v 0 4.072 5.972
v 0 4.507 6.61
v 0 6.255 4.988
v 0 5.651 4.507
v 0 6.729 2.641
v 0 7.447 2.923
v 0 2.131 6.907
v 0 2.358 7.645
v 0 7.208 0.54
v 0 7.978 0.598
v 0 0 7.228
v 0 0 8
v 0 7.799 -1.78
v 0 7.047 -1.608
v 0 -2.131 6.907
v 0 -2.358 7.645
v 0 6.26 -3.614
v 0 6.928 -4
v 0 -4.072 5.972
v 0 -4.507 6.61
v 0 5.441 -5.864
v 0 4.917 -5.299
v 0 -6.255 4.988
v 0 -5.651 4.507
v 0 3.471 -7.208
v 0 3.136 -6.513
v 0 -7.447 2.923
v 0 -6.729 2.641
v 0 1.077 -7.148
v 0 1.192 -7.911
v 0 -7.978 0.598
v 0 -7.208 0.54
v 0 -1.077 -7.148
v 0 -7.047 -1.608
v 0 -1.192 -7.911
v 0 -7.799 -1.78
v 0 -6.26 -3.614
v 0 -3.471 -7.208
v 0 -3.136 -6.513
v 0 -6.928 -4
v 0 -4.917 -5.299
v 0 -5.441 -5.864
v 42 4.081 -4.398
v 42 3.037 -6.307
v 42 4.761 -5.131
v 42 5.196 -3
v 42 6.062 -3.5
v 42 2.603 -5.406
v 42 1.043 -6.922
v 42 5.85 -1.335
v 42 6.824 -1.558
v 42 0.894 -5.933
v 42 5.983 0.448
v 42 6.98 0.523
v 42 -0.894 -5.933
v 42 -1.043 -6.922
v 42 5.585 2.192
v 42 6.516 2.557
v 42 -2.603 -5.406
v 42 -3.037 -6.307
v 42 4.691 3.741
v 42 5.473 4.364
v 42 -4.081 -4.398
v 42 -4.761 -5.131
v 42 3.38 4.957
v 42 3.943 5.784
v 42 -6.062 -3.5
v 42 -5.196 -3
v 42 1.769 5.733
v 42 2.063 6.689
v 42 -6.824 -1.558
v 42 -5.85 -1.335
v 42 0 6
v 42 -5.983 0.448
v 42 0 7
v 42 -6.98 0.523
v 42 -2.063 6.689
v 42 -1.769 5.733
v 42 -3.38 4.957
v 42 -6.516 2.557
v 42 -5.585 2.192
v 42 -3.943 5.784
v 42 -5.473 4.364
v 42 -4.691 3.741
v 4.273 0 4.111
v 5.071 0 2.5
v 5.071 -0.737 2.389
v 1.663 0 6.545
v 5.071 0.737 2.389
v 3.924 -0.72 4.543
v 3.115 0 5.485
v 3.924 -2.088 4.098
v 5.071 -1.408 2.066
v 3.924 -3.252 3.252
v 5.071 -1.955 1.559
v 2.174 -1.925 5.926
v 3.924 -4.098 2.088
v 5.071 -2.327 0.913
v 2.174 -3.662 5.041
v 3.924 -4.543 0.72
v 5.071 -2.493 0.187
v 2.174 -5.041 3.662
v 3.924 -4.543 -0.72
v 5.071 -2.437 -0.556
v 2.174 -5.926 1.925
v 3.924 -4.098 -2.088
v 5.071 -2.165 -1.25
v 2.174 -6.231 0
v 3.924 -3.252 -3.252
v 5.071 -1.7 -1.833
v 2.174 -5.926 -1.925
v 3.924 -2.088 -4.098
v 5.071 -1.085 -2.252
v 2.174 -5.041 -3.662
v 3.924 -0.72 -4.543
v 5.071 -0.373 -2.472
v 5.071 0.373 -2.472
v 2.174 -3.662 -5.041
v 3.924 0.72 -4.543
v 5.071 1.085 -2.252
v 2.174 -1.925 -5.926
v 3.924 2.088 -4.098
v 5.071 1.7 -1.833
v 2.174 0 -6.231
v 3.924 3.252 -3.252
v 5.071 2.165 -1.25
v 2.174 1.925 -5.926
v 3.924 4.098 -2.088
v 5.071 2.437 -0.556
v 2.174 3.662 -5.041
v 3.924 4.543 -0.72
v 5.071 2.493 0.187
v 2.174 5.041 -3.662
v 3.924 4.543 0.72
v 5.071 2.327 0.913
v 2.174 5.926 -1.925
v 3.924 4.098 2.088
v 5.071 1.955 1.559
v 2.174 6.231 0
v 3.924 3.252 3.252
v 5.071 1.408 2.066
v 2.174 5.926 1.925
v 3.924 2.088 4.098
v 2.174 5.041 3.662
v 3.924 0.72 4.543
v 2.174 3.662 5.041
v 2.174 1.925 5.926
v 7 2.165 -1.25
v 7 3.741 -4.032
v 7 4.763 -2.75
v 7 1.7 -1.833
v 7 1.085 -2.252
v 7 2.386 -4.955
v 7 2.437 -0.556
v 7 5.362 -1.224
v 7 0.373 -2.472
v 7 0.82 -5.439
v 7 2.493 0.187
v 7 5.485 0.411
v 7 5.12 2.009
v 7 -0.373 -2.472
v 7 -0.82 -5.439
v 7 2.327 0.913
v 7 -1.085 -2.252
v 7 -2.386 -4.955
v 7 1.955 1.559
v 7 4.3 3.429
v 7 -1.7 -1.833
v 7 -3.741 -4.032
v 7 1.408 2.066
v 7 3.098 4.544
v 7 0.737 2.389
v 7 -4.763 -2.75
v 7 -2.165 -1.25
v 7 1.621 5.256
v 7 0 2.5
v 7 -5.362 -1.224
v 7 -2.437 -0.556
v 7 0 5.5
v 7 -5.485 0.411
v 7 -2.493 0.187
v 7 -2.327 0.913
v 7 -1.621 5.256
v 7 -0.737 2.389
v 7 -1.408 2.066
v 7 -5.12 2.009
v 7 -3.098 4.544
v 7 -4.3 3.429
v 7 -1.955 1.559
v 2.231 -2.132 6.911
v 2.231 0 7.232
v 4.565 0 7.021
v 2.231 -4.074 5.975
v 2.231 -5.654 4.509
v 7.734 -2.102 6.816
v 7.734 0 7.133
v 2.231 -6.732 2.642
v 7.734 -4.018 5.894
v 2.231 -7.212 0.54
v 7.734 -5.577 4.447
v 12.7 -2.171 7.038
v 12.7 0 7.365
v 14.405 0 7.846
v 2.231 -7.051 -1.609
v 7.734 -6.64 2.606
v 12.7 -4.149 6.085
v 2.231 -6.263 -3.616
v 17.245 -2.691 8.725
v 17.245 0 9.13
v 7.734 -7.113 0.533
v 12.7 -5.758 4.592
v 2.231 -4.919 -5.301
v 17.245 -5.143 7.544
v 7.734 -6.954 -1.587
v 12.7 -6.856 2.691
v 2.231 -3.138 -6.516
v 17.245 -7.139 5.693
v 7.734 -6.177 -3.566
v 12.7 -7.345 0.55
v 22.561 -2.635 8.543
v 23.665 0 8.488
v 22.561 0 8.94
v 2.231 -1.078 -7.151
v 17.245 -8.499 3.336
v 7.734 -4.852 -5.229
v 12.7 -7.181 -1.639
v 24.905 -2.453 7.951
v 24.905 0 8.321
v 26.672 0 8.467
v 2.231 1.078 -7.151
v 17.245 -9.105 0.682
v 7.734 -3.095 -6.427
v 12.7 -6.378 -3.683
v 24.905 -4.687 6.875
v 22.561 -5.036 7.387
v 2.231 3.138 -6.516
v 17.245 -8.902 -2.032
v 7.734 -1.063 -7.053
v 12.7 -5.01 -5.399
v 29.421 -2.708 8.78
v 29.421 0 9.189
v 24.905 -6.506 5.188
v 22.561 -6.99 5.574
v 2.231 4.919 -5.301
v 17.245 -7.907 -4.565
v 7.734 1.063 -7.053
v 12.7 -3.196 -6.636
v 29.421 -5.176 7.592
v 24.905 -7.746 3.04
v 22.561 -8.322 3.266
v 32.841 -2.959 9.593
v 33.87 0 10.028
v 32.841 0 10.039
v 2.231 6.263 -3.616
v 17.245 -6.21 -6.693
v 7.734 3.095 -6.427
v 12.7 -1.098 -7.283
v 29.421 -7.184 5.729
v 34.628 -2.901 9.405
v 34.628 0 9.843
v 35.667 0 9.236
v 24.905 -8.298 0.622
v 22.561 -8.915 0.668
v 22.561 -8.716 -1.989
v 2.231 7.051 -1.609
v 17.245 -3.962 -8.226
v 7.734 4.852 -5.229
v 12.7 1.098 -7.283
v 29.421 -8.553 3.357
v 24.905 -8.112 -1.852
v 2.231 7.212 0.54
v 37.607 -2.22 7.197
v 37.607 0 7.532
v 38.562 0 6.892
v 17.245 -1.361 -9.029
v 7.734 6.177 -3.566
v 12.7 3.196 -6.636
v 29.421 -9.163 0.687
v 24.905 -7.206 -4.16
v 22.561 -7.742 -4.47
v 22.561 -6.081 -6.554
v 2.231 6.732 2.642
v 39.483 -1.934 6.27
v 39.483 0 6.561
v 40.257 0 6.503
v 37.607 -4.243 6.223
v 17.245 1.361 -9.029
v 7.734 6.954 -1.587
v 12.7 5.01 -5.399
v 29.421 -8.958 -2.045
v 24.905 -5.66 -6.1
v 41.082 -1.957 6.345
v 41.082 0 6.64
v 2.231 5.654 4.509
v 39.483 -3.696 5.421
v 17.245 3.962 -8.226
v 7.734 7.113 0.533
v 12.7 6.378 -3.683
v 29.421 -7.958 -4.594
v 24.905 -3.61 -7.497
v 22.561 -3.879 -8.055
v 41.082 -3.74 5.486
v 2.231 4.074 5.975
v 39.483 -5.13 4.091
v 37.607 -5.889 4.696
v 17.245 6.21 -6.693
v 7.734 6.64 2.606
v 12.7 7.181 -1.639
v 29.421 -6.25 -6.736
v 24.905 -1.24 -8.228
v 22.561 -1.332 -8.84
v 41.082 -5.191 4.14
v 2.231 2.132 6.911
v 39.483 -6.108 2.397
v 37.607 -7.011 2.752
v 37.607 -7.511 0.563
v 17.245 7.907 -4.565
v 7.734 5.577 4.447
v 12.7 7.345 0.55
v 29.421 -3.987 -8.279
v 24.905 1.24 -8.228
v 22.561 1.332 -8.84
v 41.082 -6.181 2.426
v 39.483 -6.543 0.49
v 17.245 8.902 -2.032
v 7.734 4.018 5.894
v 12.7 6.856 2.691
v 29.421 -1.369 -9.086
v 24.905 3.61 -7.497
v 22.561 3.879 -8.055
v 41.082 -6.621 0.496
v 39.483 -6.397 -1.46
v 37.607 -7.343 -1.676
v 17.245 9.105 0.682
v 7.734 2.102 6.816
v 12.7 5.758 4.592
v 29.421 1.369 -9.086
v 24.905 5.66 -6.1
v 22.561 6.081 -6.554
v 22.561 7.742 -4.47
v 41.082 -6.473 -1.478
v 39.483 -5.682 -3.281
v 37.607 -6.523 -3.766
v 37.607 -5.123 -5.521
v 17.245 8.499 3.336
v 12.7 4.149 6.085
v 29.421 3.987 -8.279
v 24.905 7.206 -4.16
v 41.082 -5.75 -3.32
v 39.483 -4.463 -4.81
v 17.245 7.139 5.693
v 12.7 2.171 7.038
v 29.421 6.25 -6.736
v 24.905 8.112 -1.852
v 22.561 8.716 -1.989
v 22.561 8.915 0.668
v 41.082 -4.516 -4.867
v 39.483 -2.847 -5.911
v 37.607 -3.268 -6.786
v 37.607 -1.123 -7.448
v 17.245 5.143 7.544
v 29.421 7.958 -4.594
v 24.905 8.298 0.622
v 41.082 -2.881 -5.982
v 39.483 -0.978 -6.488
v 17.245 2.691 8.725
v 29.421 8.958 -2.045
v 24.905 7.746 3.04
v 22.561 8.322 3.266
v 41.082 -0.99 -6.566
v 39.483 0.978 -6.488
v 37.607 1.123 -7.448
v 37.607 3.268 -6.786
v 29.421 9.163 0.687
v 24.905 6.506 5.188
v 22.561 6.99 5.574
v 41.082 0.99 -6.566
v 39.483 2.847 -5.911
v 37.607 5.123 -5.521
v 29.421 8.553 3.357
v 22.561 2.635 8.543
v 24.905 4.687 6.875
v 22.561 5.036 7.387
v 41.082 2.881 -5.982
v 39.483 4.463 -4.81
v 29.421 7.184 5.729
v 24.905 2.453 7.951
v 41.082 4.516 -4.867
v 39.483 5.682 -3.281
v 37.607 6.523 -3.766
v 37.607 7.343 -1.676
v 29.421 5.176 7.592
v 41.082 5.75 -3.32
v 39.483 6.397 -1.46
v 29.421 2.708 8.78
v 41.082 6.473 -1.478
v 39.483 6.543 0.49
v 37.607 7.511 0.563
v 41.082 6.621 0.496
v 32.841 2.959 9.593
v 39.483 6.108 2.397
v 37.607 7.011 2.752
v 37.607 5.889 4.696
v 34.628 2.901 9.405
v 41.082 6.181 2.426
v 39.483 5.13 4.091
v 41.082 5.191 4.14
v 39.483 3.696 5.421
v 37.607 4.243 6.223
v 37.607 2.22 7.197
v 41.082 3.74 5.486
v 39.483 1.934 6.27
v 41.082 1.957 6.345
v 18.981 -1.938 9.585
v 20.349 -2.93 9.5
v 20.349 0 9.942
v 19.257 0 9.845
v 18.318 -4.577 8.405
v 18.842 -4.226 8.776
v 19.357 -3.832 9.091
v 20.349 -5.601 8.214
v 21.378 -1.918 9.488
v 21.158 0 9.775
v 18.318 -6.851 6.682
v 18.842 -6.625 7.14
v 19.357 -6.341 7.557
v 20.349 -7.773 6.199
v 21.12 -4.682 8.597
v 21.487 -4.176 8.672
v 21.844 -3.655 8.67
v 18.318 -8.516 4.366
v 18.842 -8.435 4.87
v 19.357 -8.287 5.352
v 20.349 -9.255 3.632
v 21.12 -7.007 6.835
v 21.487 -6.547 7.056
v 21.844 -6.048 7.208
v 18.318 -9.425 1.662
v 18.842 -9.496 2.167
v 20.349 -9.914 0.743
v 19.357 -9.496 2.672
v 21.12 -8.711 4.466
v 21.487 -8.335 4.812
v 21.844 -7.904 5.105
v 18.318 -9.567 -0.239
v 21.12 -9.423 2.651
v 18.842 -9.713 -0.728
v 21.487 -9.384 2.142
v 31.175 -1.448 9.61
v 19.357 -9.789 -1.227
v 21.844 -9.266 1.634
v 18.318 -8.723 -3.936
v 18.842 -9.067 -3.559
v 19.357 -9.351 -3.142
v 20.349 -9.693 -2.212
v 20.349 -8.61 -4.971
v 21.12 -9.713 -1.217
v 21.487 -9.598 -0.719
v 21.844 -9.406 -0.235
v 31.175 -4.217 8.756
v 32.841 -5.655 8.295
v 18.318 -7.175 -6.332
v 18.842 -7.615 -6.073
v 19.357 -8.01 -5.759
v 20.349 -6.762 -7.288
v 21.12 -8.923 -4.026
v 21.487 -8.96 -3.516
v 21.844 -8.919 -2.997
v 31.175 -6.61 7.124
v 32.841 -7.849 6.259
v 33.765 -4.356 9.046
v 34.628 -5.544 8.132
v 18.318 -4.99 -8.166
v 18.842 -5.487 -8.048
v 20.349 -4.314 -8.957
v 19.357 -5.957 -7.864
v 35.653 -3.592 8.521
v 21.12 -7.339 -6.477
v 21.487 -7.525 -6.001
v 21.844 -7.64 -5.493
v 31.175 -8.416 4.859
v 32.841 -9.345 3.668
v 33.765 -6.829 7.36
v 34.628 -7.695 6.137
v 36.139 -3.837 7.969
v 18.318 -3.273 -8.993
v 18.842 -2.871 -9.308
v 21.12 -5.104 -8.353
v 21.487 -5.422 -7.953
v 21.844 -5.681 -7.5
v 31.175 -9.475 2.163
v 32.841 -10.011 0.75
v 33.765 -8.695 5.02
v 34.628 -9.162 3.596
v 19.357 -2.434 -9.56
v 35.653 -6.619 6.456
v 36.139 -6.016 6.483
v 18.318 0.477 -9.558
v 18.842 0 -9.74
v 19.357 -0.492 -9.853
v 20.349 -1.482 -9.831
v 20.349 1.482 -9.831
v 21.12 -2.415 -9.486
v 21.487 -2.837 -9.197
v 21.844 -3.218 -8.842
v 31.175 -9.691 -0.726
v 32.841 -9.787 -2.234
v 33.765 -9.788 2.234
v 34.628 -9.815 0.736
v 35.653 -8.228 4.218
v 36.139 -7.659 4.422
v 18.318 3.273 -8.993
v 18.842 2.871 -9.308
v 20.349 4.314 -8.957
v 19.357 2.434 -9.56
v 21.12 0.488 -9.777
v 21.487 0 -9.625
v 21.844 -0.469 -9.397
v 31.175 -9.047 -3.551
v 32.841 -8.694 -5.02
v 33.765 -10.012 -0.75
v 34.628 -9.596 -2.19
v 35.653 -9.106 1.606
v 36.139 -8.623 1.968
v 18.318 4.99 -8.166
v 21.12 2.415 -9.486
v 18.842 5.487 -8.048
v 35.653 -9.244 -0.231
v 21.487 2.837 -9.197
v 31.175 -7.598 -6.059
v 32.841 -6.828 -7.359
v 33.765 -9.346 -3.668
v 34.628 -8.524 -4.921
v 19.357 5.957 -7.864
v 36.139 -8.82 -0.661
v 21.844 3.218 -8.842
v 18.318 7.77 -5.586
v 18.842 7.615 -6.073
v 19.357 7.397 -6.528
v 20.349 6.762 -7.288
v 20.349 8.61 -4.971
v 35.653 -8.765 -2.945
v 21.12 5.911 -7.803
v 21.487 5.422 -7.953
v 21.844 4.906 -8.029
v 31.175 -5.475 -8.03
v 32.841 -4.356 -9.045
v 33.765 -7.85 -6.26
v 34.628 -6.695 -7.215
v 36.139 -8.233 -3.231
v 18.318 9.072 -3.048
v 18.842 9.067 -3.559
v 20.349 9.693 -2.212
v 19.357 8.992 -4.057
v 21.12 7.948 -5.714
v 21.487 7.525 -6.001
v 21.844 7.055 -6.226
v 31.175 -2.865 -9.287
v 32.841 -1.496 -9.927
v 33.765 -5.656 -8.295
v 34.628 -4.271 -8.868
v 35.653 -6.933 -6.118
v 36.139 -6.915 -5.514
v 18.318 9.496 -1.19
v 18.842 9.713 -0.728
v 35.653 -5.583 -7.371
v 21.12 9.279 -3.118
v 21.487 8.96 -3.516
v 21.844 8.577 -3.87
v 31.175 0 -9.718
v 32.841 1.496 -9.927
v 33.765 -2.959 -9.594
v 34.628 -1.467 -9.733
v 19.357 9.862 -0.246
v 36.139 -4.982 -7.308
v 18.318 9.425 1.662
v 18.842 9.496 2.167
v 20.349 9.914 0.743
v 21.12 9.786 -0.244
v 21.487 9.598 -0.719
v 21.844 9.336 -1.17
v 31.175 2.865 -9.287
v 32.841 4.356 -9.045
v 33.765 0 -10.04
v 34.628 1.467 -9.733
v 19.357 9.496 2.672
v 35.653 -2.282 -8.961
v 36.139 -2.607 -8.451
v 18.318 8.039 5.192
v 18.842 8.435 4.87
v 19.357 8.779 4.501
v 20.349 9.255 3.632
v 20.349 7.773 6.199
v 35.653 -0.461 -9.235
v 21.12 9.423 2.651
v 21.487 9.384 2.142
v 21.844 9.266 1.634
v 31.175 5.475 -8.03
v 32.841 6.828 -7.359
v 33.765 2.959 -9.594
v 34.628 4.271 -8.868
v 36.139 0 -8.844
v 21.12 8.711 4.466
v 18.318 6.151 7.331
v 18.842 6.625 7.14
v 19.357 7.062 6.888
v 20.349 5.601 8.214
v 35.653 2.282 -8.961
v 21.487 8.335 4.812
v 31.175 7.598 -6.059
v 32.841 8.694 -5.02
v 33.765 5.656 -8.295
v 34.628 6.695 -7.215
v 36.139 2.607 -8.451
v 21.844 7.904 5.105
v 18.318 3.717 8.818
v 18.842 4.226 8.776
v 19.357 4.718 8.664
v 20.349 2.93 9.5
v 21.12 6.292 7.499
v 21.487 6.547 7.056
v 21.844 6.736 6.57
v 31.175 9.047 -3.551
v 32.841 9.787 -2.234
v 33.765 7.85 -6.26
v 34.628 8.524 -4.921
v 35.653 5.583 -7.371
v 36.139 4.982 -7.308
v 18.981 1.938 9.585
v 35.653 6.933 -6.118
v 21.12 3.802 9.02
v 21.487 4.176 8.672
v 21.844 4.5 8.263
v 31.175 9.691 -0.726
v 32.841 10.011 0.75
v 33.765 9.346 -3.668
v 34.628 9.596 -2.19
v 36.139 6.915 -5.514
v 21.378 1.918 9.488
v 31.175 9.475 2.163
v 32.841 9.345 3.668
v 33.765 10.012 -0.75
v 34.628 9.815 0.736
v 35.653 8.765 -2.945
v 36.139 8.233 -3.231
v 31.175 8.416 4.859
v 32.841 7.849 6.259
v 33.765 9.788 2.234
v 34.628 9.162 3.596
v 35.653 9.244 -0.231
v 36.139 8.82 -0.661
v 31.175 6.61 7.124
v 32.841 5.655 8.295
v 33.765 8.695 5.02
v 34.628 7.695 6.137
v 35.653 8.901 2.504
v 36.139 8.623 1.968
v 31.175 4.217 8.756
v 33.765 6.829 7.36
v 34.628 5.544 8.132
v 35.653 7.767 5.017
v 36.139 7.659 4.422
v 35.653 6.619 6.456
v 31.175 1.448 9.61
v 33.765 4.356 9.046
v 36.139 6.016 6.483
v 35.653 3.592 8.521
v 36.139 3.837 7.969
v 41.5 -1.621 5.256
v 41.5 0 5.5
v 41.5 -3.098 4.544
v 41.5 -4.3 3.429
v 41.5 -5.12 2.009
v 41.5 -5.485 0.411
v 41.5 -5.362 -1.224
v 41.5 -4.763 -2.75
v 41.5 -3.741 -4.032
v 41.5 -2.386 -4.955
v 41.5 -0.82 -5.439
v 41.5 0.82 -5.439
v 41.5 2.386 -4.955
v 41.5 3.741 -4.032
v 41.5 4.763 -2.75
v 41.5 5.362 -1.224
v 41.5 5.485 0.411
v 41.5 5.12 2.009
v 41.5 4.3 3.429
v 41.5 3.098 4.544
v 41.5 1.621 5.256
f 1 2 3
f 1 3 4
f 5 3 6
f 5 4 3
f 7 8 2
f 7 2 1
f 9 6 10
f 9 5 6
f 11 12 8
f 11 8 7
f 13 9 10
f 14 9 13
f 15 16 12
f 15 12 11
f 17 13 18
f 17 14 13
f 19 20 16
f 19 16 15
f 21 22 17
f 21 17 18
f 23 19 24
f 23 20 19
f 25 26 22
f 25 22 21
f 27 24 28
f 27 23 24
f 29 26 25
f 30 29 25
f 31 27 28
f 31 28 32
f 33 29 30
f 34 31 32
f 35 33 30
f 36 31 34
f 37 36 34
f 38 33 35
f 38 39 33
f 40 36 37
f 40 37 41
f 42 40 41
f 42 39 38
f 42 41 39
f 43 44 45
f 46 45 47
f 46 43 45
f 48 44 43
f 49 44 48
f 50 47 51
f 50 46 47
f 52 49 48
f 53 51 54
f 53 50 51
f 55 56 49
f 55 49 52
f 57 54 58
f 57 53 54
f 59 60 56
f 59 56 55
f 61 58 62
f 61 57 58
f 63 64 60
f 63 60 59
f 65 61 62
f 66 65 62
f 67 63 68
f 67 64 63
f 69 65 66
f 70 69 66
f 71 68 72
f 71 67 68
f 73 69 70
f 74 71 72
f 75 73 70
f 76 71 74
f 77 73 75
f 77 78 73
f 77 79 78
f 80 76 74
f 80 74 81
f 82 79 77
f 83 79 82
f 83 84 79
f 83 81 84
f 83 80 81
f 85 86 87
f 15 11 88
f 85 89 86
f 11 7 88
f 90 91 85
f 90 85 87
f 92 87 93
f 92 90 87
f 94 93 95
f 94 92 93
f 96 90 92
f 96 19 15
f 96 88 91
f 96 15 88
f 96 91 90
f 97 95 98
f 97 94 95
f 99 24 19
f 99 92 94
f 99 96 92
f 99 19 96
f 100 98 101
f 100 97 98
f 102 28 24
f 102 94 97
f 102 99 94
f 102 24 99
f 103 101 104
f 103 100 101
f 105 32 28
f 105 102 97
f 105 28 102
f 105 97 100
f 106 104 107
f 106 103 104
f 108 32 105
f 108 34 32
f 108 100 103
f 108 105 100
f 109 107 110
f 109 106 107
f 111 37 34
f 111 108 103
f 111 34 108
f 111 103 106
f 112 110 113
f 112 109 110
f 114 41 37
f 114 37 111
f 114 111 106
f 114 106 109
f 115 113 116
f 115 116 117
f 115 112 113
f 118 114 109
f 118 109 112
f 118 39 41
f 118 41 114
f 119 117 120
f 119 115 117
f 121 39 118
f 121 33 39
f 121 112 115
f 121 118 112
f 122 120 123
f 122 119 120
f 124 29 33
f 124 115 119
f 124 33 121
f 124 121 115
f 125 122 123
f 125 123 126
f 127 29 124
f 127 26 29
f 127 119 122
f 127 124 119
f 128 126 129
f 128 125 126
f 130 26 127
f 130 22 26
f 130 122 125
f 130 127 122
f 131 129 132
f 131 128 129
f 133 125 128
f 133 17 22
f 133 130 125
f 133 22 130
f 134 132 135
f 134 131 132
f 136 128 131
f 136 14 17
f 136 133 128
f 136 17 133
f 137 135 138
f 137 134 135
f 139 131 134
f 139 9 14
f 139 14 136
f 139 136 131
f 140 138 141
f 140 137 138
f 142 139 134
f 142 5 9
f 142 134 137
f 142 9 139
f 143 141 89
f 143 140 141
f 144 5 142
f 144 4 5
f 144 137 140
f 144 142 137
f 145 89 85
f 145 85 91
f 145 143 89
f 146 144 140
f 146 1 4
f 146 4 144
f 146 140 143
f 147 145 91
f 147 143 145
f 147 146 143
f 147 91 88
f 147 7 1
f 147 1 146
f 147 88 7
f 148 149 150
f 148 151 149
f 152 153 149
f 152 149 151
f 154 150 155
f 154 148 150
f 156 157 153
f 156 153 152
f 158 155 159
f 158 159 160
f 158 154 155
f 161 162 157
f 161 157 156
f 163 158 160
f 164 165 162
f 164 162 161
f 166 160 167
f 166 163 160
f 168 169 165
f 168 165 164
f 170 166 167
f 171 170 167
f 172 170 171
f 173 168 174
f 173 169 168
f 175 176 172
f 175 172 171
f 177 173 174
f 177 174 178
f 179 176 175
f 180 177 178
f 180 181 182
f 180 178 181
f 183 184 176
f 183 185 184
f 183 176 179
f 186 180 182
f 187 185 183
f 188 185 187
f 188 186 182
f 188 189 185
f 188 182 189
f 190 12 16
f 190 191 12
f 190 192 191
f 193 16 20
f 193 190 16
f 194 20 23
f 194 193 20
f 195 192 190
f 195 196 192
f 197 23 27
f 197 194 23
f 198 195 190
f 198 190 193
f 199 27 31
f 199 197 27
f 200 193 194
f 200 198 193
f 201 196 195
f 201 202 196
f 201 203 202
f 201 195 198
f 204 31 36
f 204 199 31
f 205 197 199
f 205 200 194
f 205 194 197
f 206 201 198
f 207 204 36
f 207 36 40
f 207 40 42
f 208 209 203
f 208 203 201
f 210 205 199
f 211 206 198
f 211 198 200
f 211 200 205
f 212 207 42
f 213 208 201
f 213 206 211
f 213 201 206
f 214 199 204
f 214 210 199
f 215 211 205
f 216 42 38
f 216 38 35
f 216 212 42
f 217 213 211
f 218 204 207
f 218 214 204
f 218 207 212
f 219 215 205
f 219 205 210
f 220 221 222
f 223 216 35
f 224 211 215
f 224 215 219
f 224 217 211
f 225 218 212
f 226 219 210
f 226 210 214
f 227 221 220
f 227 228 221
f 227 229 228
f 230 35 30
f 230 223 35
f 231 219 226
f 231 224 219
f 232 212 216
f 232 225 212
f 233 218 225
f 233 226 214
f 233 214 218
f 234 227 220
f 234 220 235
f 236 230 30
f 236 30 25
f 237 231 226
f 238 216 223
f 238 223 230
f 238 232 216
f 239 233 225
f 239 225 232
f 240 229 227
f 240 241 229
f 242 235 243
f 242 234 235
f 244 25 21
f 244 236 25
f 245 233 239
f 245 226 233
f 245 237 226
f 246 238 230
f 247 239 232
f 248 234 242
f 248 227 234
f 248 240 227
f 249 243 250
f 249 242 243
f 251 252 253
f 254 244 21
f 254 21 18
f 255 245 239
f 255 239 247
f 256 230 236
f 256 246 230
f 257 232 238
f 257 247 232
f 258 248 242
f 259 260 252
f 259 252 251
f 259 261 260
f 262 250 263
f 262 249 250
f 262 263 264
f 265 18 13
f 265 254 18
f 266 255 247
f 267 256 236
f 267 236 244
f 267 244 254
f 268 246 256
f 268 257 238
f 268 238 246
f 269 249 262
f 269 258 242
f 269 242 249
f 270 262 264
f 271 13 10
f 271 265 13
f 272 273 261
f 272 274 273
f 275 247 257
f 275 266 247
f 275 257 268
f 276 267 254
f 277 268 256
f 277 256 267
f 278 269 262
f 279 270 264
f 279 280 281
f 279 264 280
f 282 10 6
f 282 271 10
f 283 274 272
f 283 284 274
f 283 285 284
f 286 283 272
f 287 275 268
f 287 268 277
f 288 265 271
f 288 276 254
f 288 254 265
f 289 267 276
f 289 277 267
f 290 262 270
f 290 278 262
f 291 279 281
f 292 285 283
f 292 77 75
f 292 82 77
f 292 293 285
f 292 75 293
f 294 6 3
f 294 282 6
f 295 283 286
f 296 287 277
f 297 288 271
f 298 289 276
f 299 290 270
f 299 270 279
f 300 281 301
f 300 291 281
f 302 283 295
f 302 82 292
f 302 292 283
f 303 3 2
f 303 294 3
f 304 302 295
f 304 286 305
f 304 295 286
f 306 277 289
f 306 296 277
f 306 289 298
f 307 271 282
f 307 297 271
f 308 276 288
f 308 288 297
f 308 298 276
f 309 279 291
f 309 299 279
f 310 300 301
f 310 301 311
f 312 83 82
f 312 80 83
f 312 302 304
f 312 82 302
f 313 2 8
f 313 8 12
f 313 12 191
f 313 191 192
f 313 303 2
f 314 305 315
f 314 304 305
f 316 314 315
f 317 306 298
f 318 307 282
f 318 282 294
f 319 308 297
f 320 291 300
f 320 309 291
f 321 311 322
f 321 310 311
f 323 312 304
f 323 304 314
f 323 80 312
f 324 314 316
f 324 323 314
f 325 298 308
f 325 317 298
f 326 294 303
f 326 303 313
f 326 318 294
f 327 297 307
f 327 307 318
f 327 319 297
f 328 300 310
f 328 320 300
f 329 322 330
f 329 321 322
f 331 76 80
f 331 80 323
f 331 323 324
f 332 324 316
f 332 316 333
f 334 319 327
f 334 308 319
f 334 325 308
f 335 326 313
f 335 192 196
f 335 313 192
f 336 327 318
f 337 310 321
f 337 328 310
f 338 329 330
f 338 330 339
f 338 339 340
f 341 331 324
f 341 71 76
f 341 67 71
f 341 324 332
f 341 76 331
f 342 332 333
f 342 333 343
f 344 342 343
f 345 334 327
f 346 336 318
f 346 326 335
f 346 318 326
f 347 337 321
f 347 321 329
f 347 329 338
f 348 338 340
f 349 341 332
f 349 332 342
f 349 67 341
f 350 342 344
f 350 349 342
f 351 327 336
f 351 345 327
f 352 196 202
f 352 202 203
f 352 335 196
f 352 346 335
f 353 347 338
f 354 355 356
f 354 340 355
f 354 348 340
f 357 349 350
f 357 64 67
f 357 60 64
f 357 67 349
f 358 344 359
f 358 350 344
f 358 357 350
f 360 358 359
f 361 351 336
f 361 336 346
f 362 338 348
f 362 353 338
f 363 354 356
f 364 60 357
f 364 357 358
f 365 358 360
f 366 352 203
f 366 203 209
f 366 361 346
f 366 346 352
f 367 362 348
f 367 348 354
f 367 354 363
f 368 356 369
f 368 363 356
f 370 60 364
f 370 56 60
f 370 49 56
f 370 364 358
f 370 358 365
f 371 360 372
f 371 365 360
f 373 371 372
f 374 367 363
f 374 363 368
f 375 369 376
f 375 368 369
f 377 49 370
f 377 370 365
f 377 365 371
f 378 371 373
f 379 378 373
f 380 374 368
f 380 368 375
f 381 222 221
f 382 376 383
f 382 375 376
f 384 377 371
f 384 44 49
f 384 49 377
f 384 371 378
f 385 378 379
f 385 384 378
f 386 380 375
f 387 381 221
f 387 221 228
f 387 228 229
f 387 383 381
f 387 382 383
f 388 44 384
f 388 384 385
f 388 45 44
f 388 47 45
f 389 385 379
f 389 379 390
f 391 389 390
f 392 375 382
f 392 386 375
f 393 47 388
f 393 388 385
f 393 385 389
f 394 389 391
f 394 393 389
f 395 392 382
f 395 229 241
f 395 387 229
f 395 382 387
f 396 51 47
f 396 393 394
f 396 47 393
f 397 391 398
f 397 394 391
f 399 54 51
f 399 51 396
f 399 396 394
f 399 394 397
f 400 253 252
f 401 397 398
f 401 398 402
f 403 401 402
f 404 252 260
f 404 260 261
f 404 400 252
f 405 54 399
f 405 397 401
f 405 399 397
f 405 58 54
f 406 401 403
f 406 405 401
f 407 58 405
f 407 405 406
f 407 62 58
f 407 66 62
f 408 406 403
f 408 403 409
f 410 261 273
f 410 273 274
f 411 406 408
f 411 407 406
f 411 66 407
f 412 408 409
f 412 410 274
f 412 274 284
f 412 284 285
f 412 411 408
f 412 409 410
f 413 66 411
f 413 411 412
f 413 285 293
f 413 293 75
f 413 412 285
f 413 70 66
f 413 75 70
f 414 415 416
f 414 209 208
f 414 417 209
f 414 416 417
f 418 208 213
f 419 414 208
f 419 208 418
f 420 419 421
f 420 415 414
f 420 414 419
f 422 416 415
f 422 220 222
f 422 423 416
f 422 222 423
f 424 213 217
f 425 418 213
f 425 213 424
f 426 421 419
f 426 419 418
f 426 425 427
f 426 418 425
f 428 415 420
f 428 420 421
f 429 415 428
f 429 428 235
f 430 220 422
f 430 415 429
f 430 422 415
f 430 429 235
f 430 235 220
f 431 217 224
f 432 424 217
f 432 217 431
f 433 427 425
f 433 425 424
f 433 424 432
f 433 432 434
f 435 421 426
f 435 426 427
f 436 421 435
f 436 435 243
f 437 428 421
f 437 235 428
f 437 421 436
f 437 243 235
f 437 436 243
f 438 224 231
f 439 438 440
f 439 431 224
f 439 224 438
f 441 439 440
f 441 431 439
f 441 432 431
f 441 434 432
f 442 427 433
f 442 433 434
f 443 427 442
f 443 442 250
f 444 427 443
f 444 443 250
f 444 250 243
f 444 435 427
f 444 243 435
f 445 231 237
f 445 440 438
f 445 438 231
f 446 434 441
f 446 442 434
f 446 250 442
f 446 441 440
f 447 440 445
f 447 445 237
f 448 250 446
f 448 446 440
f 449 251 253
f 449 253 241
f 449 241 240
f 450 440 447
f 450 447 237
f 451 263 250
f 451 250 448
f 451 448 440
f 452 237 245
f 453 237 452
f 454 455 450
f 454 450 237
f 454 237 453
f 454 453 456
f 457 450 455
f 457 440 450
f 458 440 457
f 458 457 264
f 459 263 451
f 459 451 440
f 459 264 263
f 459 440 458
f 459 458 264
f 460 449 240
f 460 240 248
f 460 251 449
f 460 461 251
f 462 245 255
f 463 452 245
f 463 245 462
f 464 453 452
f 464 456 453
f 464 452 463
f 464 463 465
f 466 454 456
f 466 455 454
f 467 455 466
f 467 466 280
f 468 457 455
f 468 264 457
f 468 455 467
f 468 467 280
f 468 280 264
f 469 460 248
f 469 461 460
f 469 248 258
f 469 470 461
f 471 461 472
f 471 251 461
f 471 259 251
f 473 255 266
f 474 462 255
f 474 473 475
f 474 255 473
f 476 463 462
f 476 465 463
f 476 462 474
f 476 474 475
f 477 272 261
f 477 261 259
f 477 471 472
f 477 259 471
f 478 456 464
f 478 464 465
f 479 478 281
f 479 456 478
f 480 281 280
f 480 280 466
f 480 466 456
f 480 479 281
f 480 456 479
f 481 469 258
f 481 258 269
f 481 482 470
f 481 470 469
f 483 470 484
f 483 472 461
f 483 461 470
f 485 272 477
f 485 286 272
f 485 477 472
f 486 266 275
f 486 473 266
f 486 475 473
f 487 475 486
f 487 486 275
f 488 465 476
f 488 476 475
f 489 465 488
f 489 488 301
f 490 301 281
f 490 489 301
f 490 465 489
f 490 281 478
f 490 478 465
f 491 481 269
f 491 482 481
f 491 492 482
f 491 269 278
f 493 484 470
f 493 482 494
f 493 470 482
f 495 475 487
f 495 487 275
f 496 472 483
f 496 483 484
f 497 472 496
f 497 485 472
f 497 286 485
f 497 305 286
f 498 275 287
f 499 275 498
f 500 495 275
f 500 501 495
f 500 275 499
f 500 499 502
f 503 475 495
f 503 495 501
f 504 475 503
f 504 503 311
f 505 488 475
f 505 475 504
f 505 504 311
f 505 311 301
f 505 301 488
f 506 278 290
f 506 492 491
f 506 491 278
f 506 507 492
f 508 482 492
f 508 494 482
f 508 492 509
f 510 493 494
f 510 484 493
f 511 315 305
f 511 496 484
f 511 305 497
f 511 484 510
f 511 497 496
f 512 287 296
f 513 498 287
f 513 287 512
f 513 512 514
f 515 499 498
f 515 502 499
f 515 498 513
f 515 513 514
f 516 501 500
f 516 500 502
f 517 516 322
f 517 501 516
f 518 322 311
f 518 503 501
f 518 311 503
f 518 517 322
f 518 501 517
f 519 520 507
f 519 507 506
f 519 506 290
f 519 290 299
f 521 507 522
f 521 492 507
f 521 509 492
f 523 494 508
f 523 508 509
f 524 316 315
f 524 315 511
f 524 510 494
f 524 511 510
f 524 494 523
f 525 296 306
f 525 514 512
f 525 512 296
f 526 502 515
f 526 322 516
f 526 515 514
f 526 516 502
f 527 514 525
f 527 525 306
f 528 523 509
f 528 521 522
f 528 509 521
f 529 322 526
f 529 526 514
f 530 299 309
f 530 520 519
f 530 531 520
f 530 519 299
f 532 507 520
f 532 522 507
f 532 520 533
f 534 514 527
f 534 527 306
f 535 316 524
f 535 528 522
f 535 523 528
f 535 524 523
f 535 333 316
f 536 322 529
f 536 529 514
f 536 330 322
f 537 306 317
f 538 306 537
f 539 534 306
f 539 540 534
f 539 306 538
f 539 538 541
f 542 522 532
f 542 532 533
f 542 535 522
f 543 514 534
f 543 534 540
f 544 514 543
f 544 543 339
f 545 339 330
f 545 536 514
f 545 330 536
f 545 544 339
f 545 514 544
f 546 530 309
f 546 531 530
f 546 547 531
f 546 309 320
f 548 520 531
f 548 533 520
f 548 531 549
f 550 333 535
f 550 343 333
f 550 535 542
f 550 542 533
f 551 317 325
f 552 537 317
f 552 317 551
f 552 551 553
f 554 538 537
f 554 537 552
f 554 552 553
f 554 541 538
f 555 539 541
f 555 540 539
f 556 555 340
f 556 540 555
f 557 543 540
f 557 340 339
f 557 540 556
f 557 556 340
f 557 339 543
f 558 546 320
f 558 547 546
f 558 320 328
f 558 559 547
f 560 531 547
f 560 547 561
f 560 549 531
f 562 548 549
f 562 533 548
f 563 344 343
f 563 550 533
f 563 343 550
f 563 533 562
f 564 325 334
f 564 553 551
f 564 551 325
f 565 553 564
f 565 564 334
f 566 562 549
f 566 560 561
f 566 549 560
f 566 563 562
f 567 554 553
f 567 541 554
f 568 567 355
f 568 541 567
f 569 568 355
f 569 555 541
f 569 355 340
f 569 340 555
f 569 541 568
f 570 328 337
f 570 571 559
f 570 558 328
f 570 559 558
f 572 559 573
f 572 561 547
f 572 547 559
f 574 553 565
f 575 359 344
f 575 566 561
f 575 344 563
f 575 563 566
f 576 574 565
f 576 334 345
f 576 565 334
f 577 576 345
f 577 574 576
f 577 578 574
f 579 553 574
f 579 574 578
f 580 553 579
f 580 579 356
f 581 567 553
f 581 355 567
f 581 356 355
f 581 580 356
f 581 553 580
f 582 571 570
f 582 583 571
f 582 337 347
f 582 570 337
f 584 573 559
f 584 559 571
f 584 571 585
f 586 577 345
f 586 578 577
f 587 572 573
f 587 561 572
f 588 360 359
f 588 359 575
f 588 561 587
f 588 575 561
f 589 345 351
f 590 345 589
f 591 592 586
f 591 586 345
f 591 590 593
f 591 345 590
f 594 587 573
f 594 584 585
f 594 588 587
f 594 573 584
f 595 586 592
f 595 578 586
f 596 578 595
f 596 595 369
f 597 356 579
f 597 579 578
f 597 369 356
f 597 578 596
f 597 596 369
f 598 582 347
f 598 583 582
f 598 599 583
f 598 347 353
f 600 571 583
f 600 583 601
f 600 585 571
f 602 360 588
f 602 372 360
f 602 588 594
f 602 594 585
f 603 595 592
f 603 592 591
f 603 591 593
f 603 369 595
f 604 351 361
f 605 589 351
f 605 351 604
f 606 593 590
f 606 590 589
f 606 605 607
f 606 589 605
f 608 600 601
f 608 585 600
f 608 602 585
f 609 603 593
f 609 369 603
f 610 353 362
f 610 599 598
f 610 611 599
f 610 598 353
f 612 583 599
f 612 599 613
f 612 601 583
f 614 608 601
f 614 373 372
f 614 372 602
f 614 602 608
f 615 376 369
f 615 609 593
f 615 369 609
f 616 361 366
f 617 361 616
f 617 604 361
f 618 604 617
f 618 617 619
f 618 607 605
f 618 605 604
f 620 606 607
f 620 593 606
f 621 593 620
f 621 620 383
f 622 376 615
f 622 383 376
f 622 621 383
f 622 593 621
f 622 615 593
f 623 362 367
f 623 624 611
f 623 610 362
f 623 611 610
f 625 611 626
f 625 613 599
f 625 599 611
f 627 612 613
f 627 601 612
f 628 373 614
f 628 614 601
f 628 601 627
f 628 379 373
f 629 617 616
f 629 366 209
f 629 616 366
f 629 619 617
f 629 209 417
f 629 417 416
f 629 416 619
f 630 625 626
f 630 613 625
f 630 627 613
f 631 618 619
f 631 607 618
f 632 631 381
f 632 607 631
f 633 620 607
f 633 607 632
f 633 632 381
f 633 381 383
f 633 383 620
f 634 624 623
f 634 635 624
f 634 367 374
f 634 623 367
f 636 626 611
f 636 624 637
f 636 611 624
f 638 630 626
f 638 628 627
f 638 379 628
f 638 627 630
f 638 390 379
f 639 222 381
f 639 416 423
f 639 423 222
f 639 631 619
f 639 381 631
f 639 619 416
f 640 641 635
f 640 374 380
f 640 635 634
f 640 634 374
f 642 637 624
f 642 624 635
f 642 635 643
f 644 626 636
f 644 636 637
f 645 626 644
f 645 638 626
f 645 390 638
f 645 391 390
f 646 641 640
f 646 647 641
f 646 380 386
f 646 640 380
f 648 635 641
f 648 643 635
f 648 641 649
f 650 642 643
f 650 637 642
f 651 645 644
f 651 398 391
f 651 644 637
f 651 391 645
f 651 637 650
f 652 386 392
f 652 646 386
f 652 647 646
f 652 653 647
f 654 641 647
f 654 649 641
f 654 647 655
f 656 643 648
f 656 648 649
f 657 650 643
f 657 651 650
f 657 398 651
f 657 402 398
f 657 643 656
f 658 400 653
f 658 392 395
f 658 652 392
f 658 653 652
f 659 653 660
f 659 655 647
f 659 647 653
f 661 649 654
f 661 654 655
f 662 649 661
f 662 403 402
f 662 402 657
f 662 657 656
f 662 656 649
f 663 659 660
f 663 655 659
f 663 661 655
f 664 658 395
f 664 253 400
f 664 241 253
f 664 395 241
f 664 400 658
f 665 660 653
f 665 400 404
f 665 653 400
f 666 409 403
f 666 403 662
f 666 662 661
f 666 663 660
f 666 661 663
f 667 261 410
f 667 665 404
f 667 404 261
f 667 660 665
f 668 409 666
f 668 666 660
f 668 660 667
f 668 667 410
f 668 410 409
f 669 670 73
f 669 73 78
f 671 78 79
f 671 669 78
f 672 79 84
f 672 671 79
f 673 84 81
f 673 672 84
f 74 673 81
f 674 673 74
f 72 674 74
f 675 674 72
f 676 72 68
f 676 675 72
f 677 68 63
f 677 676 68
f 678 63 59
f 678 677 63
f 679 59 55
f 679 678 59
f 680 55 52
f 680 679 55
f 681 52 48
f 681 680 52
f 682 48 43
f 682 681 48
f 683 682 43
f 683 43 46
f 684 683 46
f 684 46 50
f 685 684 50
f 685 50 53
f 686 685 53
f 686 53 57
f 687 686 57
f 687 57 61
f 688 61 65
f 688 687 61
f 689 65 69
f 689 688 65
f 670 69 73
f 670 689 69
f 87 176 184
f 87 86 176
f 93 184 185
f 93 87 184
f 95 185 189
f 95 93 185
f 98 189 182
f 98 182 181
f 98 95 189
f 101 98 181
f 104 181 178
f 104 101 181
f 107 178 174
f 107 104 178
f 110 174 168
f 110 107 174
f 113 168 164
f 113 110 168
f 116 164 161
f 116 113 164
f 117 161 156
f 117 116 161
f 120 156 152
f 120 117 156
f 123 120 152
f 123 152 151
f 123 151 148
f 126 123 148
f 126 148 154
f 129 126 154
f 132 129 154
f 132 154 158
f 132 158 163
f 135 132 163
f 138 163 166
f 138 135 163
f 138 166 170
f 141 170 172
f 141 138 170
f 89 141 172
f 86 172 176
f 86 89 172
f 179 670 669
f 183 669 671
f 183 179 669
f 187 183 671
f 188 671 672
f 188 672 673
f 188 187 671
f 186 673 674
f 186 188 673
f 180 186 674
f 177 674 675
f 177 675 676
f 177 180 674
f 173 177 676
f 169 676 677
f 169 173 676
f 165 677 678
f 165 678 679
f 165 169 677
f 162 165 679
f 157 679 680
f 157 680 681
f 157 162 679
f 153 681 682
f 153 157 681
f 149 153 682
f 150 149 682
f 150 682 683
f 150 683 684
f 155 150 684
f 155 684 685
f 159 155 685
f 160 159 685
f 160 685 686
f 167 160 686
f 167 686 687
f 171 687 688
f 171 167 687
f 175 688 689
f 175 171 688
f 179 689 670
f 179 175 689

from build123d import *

# Parameters (mm, degrees)
CHANFREIN4_SIZE = 0.5


with BuildPart() as part:
    # Esquisse1 → Base-Révolution (revolve)
    with BuildSketch(Plane.XY, mode=Mode.PRIVATE) as base_r_volution_sk:
        with BuildLine():
            Line((0, 7.228416147), (0, 8))
            add(Edge.make_bspline(
                [(0, 8), (2.710486751, 6.571306957), (7.554112681, 7.409869736), (14.490718914, 6.910977773), (19.758402328, 11.163876116), (23.628444764, 7.958140122), (28.51167236, 8.530202025), (35.801513751, 11.908208161), (38.337815251, 5.17521673), (42, 7)],
                knots=[0, 0, 0, 0, 0.207610209, 0.324502855, 0.503256275, 0.537353243, 0.665472533, 0.817129399, 1, 1, 1, 1], degree=3))
            Line((42, 7), (42, 5.5))
            Line((42, 5.5), (7, 5.5))
            Line((7, 5.5), (7, 2.5))
            Line((7, 2.5), (5.071067812, 2.5))
            ThreePointArc((5.071067812, 2.5), (3.114738276, 5.485385344), (0, 7.228416147))
        make_face()
    revolve(base_r_volution_sk.sketch.rotate(Axis((-84.213521127, 0, 0), (1, 0, 0)), 90), axis=Axis((-84.213521127, 0, 0), (1, 0, 0)))  # turned: the seam where the file's is

    # Chanfrein4
    chanfrein4_edges = [part.edges().sort_by_distance(p)[0] for p in [
        (42, 0, -5.5),
    ]]
    chamfer(chanfrein4_edges, length=CHANFREIN4_SIZE)


solid = part.part
